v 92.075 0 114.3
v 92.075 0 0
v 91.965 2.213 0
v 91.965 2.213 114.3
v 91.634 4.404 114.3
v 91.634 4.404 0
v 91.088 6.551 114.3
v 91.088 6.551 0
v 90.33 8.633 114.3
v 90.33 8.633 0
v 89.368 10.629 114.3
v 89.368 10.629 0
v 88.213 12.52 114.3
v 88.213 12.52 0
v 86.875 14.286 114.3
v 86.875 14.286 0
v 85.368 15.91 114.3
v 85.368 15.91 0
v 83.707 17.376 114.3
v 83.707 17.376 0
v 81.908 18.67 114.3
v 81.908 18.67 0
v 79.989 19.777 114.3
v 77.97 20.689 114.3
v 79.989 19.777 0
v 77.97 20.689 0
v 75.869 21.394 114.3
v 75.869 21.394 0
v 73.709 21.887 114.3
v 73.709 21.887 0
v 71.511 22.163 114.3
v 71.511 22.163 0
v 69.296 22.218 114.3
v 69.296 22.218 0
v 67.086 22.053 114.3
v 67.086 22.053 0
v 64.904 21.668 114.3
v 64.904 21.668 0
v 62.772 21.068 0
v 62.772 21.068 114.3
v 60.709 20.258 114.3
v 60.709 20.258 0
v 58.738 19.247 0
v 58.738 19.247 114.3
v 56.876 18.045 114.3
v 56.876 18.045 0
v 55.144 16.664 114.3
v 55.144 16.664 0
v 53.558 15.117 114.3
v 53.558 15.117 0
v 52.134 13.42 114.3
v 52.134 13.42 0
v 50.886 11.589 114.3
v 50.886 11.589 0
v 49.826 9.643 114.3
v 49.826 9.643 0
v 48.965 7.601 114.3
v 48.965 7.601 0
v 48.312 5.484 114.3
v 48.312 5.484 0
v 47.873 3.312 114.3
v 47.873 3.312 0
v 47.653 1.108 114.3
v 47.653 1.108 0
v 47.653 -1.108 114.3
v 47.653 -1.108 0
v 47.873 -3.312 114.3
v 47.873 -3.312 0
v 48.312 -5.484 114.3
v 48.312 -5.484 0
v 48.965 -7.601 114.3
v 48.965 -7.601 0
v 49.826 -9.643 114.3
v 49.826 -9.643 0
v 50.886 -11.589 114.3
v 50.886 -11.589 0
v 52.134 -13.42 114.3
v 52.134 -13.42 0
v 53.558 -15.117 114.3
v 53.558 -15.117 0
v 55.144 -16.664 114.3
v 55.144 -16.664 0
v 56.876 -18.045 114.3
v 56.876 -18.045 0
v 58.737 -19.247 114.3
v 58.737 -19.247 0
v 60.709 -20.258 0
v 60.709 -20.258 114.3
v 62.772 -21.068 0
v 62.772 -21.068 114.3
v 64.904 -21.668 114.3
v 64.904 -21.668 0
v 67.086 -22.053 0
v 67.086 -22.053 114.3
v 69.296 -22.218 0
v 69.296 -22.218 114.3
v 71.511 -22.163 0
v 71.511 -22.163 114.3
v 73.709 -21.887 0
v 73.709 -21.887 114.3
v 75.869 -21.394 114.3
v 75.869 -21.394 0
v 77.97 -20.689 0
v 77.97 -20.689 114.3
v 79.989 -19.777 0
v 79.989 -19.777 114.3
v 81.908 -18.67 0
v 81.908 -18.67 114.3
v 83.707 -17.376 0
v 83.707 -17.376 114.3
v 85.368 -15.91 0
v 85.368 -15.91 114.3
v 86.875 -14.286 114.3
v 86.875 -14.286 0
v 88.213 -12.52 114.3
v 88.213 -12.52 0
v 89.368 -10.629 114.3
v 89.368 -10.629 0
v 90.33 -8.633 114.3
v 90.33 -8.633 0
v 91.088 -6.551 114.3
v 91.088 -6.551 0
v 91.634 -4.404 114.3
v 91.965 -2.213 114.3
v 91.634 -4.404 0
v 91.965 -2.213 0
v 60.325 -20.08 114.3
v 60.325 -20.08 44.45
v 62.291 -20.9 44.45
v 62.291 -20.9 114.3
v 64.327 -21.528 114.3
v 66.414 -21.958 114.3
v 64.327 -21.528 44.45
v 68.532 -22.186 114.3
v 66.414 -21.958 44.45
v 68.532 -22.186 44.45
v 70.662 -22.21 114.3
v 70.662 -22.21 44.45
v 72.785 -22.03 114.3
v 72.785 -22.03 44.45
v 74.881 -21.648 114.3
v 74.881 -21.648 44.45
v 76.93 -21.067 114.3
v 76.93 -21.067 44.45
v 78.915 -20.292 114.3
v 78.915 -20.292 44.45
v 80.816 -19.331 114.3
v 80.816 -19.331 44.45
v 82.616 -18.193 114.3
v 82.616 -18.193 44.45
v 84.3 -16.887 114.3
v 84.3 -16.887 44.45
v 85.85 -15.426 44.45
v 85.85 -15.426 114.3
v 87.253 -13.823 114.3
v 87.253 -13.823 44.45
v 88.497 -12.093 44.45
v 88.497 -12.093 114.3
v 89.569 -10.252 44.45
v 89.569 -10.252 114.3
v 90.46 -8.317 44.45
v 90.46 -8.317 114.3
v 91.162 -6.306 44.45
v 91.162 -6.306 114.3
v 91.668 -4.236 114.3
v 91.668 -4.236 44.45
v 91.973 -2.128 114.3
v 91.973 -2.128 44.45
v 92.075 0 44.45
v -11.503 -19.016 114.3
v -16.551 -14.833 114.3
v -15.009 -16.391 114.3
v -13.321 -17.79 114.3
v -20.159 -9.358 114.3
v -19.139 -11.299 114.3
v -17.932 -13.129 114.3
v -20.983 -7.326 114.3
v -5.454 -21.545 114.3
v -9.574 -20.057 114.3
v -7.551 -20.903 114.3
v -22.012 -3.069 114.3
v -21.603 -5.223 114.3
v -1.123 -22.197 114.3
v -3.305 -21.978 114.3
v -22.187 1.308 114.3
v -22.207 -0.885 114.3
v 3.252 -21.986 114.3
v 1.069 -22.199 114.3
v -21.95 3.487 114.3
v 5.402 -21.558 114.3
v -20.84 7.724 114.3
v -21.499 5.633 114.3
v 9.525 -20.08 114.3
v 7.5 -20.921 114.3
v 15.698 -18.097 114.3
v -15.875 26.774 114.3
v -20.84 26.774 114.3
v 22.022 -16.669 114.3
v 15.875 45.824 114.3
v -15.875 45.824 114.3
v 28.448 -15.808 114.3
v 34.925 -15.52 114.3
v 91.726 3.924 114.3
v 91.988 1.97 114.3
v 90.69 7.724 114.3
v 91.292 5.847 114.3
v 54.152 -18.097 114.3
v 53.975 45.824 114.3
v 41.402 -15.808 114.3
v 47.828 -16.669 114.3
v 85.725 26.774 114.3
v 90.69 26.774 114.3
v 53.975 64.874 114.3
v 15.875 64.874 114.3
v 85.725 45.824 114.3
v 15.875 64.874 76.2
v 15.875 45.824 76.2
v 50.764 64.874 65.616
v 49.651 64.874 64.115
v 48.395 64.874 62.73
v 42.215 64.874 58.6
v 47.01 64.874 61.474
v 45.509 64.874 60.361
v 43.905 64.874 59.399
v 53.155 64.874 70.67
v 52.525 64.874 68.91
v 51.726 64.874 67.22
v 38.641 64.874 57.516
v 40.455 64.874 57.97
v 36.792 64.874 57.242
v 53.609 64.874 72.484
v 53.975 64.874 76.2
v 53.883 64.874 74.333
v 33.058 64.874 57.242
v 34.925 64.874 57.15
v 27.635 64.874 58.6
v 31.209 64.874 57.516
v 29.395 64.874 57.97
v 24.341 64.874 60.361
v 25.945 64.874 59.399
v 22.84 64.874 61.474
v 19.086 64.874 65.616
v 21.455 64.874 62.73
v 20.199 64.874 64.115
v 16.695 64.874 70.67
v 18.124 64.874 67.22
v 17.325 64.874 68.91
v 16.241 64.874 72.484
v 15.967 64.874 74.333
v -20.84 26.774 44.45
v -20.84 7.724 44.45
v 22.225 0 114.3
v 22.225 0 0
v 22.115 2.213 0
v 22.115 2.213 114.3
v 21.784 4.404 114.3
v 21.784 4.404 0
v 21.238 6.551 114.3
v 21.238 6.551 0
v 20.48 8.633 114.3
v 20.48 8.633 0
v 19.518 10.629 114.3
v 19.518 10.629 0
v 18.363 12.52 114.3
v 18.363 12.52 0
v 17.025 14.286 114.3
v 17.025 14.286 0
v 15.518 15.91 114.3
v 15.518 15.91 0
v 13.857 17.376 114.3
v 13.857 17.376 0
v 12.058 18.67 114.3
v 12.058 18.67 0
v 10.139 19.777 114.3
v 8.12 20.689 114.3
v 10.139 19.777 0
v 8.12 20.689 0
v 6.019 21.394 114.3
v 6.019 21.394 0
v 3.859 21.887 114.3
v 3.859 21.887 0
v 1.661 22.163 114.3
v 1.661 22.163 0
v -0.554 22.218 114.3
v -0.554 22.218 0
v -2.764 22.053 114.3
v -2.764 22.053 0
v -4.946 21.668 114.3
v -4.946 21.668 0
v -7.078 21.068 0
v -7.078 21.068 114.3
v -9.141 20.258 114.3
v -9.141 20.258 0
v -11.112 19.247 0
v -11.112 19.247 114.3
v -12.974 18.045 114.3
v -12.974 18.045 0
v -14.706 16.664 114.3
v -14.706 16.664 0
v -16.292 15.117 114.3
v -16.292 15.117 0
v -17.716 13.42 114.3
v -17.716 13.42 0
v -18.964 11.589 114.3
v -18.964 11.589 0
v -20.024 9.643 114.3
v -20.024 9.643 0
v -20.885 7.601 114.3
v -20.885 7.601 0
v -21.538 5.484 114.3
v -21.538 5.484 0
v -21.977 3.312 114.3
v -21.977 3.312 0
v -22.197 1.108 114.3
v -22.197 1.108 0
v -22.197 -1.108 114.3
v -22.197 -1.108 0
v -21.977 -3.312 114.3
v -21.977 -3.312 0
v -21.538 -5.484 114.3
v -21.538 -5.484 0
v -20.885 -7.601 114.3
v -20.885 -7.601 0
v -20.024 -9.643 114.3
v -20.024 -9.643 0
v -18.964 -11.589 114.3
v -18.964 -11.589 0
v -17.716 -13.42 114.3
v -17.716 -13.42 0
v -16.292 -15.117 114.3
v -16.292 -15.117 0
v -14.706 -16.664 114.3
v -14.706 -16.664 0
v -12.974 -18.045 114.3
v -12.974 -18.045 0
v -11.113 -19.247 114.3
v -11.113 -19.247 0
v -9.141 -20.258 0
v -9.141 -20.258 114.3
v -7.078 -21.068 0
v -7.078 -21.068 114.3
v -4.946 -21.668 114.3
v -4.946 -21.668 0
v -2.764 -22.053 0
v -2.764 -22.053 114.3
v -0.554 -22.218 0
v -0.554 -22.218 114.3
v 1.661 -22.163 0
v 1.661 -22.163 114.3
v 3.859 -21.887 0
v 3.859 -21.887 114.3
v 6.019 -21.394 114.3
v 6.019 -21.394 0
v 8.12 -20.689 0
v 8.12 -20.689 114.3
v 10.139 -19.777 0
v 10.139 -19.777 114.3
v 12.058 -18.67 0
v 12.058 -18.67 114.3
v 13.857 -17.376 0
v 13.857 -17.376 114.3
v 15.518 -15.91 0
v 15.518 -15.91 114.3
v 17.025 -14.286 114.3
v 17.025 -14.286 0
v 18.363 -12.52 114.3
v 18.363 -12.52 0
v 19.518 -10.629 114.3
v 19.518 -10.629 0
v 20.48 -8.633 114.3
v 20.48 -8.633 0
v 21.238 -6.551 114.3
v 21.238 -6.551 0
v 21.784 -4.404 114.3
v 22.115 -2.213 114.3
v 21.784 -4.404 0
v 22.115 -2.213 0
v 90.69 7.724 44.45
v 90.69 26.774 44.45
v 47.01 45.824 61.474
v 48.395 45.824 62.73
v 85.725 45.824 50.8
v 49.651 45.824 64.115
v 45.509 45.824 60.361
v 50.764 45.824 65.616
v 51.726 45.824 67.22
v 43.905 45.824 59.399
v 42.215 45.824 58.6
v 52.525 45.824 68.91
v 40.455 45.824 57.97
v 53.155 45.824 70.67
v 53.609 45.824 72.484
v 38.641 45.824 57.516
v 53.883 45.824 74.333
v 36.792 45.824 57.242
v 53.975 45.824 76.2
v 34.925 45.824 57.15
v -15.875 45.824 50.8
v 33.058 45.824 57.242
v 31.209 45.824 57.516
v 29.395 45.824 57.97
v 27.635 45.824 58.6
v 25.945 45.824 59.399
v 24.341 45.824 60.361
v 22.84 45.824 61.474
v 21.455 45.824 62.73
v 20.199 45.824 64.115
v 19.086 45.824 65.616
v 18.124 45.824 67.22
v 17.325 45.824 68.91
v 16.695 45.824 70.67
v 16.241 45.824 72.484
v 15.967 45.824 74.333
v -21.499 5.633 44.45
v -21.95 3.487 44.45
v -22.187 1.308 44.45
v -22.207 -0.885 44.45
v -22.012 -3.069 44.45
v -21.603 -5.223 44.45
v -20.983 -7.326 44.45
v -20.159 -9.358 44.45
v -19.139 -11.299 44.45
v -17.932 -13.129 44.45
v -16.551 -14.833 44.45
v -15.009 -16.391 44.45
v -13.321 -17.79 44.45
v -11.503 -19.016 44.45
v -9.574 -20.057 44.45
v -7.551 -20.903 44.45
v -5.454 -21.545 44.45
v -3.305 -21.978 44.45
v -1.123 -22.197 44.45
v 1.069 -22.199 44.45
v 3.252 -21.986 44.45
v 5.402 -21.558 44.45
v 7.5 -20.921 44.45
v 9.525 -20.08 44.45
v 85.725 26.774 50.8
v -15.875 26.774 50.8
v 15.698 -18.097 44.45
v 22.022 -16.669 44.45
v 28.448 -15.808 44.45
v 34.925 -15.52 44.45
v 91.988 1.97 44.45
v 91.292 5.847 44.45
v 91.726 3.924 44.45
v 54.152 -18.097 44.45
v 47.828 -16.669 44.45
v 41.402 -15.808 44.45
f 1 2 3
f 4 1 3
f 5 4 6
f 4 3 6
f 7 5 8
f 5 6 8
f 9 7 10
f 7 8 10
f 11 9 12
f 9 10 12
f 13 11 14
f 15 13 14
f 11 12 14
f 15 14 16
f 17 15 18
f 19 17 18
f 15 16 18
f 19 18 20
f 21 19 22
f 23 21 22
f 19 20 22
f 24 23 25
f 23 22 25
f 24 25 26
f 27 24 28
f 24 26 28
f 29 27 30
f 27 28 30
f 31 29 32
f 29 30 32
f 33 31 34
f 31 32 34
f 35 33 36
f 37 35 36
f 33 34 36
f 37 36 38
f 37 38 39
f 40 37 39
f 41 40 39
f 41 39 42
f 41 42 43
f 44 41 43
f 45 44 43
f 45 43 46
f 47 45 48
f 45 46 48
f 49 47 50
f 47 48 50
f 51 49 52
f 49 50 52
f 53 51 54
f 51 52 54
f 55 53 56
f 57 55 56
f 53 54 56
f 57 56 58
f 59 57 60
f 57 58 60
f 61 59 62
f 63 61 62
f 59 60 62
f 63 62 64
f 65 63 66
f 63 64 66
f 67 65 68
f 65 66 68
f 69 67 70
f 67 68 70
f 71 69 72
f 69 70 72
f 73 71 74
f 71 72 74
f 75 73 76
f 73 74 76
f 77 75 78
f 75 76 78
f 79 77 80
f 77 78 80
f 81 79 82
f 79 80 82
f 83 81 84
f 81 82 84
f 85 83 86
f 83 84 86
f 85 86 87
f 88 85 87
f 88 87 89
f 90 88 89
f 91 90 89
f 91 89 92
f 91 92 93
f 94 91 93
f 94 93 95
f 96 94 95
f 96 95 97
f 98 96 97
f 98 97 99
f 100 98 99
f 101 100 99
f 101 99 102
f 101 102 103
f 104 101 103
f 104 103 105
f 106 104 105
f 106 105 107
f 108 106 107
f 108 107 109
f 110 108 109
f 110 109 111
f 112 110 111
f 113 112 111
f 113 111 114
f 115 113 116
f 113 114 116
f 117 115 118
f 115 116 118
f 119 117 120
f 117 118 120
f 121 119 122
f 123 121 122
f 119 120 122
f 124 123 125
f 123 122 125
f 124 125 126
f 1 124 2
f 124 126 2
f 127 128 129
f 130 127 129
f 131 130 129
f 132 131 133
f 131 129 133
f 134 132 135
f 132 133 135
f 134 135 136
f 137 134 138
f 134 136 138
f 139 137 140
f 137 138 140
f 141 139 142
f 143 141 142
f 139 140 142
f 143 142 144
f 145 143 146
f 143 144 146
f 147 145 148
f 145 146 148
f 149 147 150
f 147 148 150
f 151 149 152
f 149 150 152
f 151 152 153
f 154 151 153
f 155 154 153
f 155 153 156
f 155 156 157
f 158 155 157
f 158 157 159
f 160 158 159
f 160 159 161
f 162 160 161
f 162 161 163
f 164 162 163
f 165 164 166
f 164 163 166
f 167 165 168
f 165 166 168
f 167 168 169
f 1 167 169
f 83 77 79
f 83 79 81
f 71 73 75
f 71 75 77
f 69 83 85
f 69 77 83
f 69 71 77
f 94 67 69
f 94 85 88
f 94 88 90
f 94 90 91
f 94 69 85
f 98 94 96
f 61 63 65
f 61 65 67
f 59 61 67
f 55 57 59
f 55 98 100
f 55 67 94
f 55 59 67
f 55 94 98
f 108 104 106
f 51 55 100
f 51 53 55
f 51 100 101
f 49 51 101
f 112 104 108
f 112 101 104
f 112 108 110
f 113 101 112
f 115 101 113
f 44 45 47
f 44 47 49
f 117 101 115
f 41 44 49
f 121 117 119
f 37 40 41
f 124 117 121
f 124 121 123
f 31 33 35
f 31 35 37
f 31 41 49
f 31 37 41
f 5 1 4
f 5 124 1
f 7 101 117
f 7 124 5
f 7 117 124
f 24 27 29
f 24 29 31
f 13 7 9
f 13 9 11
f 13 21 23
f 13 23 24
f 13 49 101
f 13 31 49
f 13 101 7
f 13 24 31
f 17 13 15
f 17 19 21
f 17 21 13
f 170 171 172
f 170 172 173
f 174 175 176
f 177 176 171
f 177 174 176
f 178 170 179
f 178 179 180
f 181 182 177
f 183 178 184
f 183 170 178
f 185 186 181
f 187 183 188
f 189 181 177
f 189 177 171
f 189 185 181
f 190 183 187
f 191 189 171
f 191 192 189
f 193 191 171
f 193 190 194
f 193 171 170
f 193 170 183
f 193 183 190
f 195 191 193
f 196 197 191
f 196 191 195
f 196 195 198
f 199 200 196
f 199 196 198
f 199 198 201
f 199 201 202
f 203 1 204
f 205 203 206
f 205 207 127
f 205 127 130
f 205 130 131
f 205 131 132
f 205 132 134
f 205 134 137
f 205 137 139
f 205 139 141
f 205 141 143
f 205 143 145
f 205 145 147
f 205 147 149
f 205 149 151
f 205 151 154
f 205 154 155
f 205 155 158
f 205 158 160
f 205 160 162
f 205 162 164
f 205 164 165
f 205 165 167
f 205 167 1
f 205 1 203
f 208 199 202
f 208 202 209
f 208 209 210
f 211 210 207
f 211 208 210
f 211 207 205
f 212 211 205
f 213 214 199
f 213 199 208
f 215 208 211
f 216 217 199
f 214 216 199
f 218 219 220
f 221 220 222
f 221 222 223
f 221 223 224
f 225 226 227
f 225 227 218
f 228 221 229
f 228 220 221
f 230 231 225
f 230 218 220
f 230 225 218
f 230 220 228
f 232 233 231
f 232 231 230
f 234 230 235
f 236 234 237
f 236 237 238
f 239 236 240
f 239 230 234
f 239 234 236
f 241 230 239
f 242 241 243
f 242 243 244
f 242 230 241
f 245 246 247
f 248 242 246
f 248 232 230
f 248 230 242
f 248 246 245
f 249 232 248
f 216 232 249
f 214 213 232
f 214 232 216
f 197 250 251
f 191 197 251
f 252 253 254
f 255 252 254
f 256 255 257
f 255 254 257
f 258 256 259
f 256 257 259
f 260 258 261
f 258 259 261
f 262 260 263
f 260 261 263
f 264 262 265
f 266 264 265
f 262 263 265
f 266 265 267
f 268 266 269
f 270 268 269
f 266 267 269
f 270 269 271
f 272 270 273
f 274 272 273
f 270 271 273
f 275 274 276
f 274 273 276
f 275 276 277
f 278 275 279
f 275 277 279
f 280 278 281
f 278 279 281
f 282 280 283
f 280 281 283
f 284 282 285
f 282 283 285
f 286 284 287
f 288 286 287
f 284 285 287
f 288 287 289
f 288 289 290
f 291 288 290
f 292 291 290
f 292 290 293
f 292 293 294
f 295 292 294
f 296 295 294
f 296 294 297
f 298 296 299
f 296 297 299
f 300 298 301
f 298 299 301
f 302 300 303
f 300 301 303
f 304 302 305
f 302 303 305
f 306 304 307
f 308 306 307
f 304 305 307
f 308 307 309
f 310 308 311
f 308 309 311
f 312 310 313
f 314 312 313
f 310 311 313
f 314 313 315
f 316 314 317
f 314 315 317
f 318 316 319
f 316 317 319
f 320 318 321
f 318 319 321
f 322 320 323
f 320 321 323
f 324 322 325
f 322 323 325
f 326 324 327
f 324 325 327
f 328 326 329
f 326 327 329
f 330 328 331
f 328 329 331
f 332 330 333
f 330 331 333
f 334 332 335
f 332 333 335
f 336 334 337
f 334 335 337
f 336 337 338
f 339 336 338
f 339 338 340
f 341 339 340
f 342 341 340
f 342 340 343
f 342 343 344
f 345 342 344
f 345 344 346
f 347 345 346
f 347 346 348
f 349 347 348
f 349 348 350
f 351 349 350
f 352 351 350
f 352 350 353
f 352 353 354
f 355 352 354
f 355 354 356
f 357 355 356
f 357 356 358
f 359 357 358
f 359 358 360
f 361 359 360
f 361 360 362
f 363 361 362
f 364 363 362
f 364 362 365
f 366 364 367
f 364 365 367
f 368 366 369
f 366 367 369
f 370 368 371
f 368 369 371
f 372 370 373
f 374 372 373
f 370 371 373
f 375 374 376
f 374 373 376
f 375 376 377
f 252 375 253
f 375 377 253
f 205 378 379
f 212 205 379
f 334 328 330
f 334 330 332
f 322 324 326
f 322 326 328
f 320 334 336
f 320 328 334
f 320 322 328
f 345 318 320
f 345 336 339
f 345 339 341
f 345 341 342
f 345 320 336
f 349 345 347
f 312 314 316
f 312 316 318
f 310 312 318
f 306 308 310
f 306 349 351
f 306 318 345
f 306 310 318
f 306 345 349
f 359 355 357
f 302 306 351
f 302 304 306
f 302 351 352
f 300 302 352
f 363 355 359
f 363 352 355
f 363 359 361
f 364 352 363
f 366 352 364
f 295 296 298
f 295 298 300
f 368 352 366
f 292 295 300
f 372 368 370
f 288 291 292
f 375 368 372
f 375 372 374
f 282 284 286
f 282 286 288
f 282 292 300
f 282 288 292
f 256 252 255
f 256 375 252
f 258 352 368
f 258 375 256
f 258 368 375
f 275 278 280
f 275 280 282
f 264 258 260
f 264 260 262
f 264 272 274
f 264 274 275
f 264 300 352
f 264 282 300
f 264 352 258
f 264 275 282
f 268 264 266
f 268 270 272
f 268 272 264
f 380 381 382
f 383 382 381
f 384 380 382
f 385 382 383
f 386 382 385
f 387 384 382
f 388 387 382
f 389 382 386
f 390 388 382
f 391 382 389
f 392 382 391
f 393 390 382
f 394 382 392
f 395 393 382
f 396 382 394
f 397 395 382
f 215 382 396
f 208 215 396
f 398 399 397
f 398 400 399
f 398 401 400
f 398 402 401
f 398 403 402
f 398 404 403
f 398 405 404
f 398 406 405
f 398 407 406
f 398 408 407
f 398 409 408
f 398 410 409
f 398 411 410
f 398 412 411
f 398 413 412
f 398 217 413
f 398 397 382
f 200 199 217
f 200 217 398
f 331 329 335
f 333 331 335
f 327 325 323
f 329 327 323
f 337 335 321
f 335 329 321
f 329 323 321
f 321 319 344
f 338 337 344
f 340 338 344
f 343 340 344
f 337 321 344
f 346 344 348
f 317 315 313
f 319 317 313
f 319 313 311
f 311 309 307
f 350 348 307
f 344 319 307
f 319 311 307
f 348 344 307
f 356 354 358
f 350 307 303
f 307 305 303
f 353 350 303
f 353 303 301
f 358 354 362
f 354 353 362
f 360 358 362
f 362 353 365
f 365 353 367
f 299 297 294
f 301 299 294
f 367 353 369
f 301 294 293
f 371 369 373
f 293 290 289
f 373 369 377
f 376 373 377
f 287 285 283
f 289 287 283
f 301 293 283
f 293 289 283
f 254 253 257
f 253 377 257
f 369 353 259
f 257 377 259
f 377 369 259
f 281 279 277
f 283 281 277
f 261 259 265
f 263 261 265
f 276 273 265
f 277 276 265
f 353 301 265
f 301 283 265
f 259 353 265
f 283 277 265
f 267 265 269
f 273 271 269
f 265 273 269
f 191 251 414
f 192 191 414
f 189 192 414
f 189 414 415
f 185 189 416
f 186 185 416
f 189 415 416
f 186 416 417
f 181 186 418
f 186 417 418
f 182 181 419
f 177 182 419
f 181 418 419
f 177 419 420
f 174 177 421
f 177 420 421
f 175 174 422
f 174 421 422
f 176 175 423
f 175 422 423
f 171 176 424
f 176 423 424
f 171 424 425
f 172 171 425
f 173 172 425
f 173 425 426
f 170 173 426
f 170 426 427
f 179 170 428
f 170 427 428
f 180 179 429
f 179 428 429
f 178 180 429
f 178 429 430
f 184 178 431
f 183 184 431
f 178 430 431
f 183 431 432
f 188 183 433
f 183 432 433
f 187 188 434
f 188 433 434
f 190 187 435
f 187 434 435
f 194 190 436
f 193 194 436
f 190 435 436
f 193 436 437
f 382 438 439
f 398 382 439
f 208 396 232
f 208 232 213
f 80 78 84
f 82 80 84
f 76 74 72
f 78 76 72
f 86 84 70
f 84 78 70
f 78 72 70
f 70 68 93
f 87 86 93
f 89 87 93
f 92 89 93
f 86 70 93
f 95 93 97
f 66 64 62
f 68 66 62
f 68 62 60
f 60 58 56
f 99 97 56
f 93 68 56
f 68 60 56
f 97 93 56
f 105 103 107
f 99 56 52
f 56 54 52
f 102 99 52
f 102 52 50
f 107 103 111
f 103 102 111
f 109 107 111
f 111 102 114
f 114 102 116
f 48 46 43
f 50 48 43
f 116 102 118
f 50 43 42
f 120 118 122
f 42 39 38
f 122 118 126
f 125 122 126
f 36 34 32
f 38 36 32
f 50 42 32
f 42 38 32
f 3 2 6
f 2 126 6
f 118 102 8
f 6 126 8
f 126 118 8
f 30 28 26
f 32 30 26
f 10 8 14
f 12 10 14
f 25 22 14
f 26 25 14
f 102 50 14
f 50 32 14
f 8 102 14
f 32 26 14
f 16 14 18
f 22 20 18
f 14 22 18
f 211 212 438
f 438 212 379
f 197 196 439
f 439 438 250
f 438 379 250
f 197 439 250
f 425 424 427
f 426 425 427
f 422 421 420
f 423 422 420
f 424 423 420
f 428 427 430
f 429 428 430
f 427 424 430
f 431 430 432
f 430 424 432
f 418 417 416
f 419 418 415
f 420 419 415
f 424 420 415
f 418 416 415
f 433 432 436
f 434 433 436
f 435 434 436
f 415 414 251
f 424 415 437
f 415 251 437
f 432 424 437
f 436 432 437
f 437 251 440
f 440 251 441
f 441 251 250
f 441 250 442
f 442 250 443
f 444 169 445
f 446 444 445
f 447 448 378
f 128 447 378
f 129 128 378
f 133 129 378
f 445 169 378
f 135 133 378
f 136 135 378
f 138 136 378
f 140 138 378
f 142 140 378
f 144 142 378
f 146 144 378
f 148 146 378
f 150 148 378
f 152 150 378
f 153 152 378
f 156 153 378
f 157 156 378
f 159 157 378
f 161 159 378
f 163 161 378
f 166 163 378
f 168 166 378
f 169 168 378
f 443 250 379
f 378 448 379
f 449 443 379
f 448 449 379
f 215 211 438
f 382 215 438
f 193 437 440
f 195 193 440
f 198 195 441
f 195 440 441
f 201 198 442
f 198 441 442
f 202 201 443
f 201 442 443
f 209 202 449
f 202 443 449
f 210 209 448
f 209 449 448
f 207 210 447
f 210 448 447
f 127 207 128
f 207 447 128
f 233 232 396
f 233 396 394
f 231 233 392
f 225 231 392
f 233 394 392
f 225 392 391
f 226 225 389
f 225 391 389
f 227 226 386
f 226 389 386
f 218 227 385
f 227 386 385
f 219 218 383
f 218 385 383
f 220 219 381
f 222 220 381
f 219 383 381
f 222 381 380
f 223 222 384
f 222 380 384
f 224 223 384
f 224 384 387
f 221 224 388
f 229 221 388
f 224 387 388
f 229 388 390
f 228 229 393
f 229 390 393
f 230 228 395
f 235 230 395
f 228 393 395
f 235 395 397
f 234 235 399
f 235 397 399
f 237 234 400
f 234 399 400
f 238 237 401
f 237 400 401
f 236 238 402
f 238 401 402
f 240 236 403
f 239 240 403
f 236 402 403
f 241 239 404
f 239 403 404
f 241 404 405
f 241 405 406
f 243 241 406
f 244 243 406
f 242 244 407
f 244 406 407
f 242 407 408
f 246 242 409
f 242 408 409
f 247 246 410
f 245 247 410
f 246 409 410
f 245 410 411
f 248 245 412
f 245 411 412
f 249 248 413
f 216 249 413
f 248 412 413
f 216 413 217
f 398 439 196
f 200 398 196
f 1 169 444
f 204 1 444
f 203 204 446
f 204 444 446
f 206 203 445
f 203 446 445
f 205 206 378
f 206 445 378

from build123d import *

# Parameters (mm, degrees)
F0_R     = 22.225
F1_DEPTH = 114.3
F4_DEPTH = 69.85
F6_DEPTH = 19.05
F7_W     = 38.1
F7_H     = 38.1
F8_DEPTH = 19.05


with BuildPart() as f1:
    # F0 (on Top) → F1 (new body)
    with BuildSketch(Plane.XY):
        Circle(F0_R)
    extrude(amount=F1_DEPTH)


with BuildPart() as f1b:
    # F0 (on Top) → F1, piece 2 (new body)
    with BuildSketch(Plane.XY):
        with Locations((69.85, 0)):
            Circle(F0_R)
    extrude(amount=F1_DEPTH)


with BuildPart() as f4:
    # F3 (on offset) → F4 (new body, through all)
    with BuildSketch(Plane.XY.offset(44.45)):
        with BuildLine():
            Line((20.8395966464, 7.7241074963), (-20.8395966464, 7.7241074963))
            ThreePointArc((-20.8395966464, 7.7241074963), (-15.0092825083, -16.3912191001), (9.525, -20.0804631421))
            ThreePointArc((9.525, -20.0804631421), (18.7835533113, -11.879762203), (22.225, 0))
            ThreePointArc((22.225, 0), (21.8759075294, 3.923683826), (20.8395966464, 7.7241074963))
        make_face()
        with BuildLine():
            Line((-20.8395966464, 26.7741074963), (-20.8395966464, 7.7241074963))
            ThreePointArc((-20.8395966464, 7.7241074963), (0, 22.225), (20.8395966464, 7.7241074963))
            Line((20.8395966464, 7.7241074963), (49.0104033536, 7.7241074963))
            ThreePointArc((49.0104033536, 7.7241074963), (69.85, 22.225), (90.6895966464, 7.7241074963))
            Line((90.6895966464, 7.7241074963), (90.6895966464, 26.7741074963))
            Line((90.6895966464, 26.7741074963), (-20.8395966464, 26.7741074963))
        make_face()
        with BuildLine():
            ThreePointArc((20.8395966464, 7.7241074963), (0, 22.225), (-20.8395966464, 7.7241074963))
            Line((-20.8395966464, 7.7241074963), (20.8395966464, 7.7241074963))
        make_face()
        with BuildLine():
            ThreePointArc((22.225, 0), (18.7835533113, -11.879762203), (9.525, -20.0804631421))
            ThreePointArc((9.525, -20.0804631421), (34.925, -15.5200042919), (60.325, -20.0804631421))
            ThreePointArc((60.325, -20.0804631421), (49.2641864511, -8.3770463488), (49.0104033536, 7.7241074963))
            Line((49.0104033536, 7.7241074963), (20.8395966464, 7.7241074963))
            ThreePointArc((20.8395966464, 7.7241074963), (21.8759075294, 3.923683826), (22.225, 0))
        make_face()
        with BuildLine():
            ThreePointArc((49.0104033536, 7.7241074963), (49.2641864511, -8.3770463488), (60.325, -20.0804631421))
            ThreePointArc((60.325, -20.0804631421), (81.729762203, -18.7835533113), (92.075, 0))
            ThreePointArc((92.075, 0), (91.7259075294, 3.923683826), (90.6895966464, 7.7241074963))
            Line((90.6895966464, 7.7241074963), (49.0104033536, 7.7241074963))
        make_face()
        with BuildLine():
            ThreePointArc((90.6895966464, 7.7241074963), (69.85, 22.225), (49.0104033536, 7.7241074963))
            Line((49.0104033536, 7.7241074963), (90.6895966464, 7.7241074963))
        make_face()
    extrude(amount=F4_DEPTH)

    # F5 (on face) → F6 (join)
    with BuildSketch(Plane(origin=(0, 26.7741074963, 0), x_dir=(-1, 0, 0), z_dir=(0, 1, 0))):
        Polygon((-85.725, 114.3), (-85.725, 50.8), (-34.925, 50.8), (-34.925, 76.2), (-34.925, 114.3), align=None)
        Polygon((-34.925, 76.2), (-34.925, 50.8), (15.875, 50.8), (15.875, 114.3), (-34.925, 114.3), align=None)
    extrude(amount=F6_DEPTH)

    # F7 (on face) → F8 (join)
    with BuildSketch(Plane(origin=(0, 45.8241074963, 0), x_dir=(-1, 0, 0), z_dir=(0, 1, 0))):
        with Locations((-34.925, 95.25)):
            Rectangle(F7_W, F7_H)
        with BuildLine():
            Line((-15.875, 76.2), (-53.975, 76.2))
            ThreePointArc((-53.975, 76.2), (-34.925, 57.15), (-15.875, 76.2))
        make_face()
    extrude(amount=F8_DEPTH)


solid = Compound([f1.part, f1b.part, f4.part])
